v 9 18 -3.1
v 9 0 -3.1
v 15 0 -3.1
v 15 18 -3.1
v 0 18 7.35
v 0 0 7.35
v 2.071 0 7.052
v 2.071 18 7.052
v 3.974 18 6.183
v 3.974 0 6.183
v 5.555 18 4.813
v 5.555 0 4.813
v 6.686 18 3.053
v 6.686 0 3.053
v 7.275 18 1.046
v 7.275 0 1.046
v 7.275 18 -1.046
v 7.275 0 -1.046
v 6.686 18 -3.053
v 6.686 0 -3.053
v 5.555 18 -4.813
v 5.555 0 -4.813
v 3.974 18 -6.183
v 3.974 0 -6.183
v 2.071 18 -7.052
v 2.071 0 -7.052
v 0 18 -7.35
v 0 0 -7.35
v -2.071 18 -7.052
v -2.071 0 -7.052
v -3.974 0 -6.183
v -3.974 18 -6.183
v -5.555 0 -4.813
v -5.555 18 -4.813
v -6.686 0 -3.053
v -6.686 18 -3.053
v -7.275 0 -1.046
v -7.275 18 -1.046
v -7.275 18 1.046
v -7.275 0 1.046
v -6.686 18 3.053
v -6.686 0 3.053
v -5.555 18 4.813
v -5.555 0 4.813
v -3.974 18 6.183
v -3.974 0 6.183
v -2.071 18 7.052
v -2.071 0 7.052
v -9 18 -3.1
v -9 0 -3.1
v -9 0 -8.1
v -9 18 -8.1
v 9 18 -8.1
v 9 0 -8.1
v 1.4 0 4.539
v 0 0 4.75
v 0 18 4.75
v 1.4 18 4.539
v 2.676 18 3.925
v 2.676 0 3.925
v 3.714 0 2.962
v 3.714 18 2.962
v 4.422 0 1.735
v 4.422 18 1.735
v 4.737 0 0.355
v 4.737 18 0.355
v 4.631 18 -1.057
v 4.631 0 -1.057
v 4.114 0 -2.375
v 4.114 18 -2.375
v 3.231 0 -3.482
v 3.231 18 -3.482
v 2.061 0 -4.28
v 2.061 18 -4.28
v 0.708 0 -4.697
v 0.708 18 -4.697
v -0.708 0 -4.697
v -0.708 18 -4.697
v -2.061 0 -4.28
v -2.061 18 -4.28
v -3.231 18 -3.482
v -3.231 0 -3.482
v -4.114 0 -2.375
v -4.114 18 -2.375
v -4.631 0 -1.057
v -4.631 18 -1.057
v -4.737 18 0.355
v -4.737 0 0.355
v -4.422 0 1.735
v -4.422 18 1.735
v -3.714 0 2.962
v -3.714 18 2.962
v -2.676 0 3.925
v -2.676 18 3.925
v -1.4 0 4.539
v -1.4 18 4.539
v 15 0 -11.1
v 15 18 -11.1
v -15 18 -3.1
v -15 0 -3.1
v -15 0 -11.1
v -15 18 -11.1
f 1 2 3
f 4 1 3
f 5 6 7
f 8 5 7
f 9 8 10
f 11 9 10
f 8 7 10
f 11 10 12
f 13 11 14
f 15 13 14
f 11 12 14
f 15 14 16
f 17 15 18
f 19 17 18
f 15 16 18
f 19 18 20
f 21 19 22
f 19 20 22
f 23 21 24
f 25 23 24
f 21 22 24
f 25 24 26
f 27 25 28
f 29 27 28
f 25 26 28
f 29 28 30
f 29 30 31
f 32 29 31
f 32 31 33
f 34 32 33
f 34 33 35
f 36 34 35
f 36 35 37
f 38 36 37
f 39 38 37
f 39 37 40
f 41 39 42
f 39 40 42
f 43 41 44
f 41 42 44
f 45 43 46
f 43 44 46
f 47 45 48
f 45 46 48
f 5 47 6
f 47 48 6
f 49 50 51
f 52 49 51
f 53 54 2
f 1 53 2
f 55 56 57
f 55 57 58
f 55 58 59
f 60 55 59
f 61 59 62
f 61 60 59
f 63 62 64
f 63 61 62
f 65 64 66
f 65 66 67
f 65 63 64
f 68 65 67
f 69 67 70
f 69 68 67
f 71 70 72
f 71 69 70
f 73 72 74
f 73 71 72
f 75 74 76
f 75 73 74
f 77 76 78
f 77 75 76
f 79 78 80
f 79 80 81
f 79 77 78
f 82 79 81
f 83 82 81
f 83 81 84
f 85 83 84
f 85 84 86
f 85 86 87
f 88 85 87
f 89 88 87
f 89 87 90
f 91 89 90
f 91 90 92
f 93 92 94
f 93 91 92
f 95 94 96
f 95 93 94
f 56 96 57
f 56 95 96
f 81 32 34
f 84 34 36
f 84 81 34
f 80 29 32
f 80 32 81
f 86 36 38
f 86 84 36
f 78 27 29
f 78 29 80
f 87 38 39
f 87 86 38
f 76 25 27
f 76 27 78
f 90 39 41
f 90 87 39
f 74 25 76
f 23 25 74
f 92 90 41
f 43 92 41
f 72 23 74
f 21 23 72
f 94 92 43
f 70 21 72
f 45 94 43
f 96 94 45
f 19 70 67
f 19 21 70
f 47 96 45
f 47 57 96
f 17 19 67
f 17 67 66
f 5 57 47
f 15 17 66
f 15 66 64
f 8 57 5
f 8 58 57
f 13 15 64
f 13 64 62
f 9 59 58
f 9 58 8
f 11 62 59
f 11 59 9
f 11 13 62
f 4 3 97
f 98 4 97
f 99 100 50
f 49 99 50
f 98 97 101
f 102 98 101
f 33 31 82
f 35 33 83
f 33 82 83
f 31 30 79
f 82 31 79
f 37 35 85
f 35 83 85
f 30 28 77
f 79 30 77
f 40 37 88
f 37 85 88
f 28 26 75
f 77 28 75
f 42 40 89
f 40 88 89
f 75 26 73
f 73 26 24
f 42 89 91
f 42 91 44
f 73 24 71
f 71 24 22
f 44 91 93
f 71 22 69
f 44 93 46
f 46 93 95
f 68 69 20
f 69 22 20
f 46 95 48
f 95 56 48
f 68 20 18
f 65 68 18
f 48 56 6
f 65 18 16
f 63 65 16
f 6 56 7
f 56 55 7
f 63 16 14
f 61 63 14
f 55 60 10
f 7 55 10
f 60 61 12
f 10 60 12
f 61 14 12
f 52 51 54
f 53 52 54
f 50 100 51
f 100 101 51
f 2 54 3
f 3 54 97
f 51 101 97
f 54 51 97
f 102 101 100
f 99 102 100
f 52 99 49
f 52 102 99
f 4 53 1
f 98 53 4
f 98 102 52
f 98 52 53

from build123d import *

# Parameters (mm, degrees)
SKETCH1_R             = 7.35
SKETCH1_R_2           = 4.75
BOSS_EXTRUDE1_DEPTH   = 18
BOSS_EXTRUDE1_2_DEPTH = 18


with BuildPart() as part:
    # Sketch1 → Boss-Extrude1 (new body)
    with BuildSketch(Plane(origin=(0, 0, 0), x_dir=(1, 0, 0), z_dir=(0, 1, 0))):
        with Locations(Location((0, 0, 0), (0, 0, 270))):
            Circle(SKETCH1_R)
        with Locations(Location((0, 0, 0), (0, 0, 270))):
            Circle(SKETCH1_R_2, mode=Mode.SUBTRACT)
    extrude(amount=BOSS_EXTRUDE1_DEPTH)


with BuildPart() as body_2:
    # Sketch1 → Boss-Extrude1 2 (new body)
    with BuildSketch(Plane(origin=(0, 0, 0), x_dir=(1, 0, 0), z_dir=(0, 1, 0))):
        Polygon((-15, 3.1), (-9, 3.1), (-9, 8.1), (9, 8.1), (9, 3.1), (15, 3.1), (15, 11.1), (-15, 11.1), align=None)
    extrude(amount=BOSS_EXTRUDE1_2_DEPTH)


solid = Compound([part.part, body_2.part])
